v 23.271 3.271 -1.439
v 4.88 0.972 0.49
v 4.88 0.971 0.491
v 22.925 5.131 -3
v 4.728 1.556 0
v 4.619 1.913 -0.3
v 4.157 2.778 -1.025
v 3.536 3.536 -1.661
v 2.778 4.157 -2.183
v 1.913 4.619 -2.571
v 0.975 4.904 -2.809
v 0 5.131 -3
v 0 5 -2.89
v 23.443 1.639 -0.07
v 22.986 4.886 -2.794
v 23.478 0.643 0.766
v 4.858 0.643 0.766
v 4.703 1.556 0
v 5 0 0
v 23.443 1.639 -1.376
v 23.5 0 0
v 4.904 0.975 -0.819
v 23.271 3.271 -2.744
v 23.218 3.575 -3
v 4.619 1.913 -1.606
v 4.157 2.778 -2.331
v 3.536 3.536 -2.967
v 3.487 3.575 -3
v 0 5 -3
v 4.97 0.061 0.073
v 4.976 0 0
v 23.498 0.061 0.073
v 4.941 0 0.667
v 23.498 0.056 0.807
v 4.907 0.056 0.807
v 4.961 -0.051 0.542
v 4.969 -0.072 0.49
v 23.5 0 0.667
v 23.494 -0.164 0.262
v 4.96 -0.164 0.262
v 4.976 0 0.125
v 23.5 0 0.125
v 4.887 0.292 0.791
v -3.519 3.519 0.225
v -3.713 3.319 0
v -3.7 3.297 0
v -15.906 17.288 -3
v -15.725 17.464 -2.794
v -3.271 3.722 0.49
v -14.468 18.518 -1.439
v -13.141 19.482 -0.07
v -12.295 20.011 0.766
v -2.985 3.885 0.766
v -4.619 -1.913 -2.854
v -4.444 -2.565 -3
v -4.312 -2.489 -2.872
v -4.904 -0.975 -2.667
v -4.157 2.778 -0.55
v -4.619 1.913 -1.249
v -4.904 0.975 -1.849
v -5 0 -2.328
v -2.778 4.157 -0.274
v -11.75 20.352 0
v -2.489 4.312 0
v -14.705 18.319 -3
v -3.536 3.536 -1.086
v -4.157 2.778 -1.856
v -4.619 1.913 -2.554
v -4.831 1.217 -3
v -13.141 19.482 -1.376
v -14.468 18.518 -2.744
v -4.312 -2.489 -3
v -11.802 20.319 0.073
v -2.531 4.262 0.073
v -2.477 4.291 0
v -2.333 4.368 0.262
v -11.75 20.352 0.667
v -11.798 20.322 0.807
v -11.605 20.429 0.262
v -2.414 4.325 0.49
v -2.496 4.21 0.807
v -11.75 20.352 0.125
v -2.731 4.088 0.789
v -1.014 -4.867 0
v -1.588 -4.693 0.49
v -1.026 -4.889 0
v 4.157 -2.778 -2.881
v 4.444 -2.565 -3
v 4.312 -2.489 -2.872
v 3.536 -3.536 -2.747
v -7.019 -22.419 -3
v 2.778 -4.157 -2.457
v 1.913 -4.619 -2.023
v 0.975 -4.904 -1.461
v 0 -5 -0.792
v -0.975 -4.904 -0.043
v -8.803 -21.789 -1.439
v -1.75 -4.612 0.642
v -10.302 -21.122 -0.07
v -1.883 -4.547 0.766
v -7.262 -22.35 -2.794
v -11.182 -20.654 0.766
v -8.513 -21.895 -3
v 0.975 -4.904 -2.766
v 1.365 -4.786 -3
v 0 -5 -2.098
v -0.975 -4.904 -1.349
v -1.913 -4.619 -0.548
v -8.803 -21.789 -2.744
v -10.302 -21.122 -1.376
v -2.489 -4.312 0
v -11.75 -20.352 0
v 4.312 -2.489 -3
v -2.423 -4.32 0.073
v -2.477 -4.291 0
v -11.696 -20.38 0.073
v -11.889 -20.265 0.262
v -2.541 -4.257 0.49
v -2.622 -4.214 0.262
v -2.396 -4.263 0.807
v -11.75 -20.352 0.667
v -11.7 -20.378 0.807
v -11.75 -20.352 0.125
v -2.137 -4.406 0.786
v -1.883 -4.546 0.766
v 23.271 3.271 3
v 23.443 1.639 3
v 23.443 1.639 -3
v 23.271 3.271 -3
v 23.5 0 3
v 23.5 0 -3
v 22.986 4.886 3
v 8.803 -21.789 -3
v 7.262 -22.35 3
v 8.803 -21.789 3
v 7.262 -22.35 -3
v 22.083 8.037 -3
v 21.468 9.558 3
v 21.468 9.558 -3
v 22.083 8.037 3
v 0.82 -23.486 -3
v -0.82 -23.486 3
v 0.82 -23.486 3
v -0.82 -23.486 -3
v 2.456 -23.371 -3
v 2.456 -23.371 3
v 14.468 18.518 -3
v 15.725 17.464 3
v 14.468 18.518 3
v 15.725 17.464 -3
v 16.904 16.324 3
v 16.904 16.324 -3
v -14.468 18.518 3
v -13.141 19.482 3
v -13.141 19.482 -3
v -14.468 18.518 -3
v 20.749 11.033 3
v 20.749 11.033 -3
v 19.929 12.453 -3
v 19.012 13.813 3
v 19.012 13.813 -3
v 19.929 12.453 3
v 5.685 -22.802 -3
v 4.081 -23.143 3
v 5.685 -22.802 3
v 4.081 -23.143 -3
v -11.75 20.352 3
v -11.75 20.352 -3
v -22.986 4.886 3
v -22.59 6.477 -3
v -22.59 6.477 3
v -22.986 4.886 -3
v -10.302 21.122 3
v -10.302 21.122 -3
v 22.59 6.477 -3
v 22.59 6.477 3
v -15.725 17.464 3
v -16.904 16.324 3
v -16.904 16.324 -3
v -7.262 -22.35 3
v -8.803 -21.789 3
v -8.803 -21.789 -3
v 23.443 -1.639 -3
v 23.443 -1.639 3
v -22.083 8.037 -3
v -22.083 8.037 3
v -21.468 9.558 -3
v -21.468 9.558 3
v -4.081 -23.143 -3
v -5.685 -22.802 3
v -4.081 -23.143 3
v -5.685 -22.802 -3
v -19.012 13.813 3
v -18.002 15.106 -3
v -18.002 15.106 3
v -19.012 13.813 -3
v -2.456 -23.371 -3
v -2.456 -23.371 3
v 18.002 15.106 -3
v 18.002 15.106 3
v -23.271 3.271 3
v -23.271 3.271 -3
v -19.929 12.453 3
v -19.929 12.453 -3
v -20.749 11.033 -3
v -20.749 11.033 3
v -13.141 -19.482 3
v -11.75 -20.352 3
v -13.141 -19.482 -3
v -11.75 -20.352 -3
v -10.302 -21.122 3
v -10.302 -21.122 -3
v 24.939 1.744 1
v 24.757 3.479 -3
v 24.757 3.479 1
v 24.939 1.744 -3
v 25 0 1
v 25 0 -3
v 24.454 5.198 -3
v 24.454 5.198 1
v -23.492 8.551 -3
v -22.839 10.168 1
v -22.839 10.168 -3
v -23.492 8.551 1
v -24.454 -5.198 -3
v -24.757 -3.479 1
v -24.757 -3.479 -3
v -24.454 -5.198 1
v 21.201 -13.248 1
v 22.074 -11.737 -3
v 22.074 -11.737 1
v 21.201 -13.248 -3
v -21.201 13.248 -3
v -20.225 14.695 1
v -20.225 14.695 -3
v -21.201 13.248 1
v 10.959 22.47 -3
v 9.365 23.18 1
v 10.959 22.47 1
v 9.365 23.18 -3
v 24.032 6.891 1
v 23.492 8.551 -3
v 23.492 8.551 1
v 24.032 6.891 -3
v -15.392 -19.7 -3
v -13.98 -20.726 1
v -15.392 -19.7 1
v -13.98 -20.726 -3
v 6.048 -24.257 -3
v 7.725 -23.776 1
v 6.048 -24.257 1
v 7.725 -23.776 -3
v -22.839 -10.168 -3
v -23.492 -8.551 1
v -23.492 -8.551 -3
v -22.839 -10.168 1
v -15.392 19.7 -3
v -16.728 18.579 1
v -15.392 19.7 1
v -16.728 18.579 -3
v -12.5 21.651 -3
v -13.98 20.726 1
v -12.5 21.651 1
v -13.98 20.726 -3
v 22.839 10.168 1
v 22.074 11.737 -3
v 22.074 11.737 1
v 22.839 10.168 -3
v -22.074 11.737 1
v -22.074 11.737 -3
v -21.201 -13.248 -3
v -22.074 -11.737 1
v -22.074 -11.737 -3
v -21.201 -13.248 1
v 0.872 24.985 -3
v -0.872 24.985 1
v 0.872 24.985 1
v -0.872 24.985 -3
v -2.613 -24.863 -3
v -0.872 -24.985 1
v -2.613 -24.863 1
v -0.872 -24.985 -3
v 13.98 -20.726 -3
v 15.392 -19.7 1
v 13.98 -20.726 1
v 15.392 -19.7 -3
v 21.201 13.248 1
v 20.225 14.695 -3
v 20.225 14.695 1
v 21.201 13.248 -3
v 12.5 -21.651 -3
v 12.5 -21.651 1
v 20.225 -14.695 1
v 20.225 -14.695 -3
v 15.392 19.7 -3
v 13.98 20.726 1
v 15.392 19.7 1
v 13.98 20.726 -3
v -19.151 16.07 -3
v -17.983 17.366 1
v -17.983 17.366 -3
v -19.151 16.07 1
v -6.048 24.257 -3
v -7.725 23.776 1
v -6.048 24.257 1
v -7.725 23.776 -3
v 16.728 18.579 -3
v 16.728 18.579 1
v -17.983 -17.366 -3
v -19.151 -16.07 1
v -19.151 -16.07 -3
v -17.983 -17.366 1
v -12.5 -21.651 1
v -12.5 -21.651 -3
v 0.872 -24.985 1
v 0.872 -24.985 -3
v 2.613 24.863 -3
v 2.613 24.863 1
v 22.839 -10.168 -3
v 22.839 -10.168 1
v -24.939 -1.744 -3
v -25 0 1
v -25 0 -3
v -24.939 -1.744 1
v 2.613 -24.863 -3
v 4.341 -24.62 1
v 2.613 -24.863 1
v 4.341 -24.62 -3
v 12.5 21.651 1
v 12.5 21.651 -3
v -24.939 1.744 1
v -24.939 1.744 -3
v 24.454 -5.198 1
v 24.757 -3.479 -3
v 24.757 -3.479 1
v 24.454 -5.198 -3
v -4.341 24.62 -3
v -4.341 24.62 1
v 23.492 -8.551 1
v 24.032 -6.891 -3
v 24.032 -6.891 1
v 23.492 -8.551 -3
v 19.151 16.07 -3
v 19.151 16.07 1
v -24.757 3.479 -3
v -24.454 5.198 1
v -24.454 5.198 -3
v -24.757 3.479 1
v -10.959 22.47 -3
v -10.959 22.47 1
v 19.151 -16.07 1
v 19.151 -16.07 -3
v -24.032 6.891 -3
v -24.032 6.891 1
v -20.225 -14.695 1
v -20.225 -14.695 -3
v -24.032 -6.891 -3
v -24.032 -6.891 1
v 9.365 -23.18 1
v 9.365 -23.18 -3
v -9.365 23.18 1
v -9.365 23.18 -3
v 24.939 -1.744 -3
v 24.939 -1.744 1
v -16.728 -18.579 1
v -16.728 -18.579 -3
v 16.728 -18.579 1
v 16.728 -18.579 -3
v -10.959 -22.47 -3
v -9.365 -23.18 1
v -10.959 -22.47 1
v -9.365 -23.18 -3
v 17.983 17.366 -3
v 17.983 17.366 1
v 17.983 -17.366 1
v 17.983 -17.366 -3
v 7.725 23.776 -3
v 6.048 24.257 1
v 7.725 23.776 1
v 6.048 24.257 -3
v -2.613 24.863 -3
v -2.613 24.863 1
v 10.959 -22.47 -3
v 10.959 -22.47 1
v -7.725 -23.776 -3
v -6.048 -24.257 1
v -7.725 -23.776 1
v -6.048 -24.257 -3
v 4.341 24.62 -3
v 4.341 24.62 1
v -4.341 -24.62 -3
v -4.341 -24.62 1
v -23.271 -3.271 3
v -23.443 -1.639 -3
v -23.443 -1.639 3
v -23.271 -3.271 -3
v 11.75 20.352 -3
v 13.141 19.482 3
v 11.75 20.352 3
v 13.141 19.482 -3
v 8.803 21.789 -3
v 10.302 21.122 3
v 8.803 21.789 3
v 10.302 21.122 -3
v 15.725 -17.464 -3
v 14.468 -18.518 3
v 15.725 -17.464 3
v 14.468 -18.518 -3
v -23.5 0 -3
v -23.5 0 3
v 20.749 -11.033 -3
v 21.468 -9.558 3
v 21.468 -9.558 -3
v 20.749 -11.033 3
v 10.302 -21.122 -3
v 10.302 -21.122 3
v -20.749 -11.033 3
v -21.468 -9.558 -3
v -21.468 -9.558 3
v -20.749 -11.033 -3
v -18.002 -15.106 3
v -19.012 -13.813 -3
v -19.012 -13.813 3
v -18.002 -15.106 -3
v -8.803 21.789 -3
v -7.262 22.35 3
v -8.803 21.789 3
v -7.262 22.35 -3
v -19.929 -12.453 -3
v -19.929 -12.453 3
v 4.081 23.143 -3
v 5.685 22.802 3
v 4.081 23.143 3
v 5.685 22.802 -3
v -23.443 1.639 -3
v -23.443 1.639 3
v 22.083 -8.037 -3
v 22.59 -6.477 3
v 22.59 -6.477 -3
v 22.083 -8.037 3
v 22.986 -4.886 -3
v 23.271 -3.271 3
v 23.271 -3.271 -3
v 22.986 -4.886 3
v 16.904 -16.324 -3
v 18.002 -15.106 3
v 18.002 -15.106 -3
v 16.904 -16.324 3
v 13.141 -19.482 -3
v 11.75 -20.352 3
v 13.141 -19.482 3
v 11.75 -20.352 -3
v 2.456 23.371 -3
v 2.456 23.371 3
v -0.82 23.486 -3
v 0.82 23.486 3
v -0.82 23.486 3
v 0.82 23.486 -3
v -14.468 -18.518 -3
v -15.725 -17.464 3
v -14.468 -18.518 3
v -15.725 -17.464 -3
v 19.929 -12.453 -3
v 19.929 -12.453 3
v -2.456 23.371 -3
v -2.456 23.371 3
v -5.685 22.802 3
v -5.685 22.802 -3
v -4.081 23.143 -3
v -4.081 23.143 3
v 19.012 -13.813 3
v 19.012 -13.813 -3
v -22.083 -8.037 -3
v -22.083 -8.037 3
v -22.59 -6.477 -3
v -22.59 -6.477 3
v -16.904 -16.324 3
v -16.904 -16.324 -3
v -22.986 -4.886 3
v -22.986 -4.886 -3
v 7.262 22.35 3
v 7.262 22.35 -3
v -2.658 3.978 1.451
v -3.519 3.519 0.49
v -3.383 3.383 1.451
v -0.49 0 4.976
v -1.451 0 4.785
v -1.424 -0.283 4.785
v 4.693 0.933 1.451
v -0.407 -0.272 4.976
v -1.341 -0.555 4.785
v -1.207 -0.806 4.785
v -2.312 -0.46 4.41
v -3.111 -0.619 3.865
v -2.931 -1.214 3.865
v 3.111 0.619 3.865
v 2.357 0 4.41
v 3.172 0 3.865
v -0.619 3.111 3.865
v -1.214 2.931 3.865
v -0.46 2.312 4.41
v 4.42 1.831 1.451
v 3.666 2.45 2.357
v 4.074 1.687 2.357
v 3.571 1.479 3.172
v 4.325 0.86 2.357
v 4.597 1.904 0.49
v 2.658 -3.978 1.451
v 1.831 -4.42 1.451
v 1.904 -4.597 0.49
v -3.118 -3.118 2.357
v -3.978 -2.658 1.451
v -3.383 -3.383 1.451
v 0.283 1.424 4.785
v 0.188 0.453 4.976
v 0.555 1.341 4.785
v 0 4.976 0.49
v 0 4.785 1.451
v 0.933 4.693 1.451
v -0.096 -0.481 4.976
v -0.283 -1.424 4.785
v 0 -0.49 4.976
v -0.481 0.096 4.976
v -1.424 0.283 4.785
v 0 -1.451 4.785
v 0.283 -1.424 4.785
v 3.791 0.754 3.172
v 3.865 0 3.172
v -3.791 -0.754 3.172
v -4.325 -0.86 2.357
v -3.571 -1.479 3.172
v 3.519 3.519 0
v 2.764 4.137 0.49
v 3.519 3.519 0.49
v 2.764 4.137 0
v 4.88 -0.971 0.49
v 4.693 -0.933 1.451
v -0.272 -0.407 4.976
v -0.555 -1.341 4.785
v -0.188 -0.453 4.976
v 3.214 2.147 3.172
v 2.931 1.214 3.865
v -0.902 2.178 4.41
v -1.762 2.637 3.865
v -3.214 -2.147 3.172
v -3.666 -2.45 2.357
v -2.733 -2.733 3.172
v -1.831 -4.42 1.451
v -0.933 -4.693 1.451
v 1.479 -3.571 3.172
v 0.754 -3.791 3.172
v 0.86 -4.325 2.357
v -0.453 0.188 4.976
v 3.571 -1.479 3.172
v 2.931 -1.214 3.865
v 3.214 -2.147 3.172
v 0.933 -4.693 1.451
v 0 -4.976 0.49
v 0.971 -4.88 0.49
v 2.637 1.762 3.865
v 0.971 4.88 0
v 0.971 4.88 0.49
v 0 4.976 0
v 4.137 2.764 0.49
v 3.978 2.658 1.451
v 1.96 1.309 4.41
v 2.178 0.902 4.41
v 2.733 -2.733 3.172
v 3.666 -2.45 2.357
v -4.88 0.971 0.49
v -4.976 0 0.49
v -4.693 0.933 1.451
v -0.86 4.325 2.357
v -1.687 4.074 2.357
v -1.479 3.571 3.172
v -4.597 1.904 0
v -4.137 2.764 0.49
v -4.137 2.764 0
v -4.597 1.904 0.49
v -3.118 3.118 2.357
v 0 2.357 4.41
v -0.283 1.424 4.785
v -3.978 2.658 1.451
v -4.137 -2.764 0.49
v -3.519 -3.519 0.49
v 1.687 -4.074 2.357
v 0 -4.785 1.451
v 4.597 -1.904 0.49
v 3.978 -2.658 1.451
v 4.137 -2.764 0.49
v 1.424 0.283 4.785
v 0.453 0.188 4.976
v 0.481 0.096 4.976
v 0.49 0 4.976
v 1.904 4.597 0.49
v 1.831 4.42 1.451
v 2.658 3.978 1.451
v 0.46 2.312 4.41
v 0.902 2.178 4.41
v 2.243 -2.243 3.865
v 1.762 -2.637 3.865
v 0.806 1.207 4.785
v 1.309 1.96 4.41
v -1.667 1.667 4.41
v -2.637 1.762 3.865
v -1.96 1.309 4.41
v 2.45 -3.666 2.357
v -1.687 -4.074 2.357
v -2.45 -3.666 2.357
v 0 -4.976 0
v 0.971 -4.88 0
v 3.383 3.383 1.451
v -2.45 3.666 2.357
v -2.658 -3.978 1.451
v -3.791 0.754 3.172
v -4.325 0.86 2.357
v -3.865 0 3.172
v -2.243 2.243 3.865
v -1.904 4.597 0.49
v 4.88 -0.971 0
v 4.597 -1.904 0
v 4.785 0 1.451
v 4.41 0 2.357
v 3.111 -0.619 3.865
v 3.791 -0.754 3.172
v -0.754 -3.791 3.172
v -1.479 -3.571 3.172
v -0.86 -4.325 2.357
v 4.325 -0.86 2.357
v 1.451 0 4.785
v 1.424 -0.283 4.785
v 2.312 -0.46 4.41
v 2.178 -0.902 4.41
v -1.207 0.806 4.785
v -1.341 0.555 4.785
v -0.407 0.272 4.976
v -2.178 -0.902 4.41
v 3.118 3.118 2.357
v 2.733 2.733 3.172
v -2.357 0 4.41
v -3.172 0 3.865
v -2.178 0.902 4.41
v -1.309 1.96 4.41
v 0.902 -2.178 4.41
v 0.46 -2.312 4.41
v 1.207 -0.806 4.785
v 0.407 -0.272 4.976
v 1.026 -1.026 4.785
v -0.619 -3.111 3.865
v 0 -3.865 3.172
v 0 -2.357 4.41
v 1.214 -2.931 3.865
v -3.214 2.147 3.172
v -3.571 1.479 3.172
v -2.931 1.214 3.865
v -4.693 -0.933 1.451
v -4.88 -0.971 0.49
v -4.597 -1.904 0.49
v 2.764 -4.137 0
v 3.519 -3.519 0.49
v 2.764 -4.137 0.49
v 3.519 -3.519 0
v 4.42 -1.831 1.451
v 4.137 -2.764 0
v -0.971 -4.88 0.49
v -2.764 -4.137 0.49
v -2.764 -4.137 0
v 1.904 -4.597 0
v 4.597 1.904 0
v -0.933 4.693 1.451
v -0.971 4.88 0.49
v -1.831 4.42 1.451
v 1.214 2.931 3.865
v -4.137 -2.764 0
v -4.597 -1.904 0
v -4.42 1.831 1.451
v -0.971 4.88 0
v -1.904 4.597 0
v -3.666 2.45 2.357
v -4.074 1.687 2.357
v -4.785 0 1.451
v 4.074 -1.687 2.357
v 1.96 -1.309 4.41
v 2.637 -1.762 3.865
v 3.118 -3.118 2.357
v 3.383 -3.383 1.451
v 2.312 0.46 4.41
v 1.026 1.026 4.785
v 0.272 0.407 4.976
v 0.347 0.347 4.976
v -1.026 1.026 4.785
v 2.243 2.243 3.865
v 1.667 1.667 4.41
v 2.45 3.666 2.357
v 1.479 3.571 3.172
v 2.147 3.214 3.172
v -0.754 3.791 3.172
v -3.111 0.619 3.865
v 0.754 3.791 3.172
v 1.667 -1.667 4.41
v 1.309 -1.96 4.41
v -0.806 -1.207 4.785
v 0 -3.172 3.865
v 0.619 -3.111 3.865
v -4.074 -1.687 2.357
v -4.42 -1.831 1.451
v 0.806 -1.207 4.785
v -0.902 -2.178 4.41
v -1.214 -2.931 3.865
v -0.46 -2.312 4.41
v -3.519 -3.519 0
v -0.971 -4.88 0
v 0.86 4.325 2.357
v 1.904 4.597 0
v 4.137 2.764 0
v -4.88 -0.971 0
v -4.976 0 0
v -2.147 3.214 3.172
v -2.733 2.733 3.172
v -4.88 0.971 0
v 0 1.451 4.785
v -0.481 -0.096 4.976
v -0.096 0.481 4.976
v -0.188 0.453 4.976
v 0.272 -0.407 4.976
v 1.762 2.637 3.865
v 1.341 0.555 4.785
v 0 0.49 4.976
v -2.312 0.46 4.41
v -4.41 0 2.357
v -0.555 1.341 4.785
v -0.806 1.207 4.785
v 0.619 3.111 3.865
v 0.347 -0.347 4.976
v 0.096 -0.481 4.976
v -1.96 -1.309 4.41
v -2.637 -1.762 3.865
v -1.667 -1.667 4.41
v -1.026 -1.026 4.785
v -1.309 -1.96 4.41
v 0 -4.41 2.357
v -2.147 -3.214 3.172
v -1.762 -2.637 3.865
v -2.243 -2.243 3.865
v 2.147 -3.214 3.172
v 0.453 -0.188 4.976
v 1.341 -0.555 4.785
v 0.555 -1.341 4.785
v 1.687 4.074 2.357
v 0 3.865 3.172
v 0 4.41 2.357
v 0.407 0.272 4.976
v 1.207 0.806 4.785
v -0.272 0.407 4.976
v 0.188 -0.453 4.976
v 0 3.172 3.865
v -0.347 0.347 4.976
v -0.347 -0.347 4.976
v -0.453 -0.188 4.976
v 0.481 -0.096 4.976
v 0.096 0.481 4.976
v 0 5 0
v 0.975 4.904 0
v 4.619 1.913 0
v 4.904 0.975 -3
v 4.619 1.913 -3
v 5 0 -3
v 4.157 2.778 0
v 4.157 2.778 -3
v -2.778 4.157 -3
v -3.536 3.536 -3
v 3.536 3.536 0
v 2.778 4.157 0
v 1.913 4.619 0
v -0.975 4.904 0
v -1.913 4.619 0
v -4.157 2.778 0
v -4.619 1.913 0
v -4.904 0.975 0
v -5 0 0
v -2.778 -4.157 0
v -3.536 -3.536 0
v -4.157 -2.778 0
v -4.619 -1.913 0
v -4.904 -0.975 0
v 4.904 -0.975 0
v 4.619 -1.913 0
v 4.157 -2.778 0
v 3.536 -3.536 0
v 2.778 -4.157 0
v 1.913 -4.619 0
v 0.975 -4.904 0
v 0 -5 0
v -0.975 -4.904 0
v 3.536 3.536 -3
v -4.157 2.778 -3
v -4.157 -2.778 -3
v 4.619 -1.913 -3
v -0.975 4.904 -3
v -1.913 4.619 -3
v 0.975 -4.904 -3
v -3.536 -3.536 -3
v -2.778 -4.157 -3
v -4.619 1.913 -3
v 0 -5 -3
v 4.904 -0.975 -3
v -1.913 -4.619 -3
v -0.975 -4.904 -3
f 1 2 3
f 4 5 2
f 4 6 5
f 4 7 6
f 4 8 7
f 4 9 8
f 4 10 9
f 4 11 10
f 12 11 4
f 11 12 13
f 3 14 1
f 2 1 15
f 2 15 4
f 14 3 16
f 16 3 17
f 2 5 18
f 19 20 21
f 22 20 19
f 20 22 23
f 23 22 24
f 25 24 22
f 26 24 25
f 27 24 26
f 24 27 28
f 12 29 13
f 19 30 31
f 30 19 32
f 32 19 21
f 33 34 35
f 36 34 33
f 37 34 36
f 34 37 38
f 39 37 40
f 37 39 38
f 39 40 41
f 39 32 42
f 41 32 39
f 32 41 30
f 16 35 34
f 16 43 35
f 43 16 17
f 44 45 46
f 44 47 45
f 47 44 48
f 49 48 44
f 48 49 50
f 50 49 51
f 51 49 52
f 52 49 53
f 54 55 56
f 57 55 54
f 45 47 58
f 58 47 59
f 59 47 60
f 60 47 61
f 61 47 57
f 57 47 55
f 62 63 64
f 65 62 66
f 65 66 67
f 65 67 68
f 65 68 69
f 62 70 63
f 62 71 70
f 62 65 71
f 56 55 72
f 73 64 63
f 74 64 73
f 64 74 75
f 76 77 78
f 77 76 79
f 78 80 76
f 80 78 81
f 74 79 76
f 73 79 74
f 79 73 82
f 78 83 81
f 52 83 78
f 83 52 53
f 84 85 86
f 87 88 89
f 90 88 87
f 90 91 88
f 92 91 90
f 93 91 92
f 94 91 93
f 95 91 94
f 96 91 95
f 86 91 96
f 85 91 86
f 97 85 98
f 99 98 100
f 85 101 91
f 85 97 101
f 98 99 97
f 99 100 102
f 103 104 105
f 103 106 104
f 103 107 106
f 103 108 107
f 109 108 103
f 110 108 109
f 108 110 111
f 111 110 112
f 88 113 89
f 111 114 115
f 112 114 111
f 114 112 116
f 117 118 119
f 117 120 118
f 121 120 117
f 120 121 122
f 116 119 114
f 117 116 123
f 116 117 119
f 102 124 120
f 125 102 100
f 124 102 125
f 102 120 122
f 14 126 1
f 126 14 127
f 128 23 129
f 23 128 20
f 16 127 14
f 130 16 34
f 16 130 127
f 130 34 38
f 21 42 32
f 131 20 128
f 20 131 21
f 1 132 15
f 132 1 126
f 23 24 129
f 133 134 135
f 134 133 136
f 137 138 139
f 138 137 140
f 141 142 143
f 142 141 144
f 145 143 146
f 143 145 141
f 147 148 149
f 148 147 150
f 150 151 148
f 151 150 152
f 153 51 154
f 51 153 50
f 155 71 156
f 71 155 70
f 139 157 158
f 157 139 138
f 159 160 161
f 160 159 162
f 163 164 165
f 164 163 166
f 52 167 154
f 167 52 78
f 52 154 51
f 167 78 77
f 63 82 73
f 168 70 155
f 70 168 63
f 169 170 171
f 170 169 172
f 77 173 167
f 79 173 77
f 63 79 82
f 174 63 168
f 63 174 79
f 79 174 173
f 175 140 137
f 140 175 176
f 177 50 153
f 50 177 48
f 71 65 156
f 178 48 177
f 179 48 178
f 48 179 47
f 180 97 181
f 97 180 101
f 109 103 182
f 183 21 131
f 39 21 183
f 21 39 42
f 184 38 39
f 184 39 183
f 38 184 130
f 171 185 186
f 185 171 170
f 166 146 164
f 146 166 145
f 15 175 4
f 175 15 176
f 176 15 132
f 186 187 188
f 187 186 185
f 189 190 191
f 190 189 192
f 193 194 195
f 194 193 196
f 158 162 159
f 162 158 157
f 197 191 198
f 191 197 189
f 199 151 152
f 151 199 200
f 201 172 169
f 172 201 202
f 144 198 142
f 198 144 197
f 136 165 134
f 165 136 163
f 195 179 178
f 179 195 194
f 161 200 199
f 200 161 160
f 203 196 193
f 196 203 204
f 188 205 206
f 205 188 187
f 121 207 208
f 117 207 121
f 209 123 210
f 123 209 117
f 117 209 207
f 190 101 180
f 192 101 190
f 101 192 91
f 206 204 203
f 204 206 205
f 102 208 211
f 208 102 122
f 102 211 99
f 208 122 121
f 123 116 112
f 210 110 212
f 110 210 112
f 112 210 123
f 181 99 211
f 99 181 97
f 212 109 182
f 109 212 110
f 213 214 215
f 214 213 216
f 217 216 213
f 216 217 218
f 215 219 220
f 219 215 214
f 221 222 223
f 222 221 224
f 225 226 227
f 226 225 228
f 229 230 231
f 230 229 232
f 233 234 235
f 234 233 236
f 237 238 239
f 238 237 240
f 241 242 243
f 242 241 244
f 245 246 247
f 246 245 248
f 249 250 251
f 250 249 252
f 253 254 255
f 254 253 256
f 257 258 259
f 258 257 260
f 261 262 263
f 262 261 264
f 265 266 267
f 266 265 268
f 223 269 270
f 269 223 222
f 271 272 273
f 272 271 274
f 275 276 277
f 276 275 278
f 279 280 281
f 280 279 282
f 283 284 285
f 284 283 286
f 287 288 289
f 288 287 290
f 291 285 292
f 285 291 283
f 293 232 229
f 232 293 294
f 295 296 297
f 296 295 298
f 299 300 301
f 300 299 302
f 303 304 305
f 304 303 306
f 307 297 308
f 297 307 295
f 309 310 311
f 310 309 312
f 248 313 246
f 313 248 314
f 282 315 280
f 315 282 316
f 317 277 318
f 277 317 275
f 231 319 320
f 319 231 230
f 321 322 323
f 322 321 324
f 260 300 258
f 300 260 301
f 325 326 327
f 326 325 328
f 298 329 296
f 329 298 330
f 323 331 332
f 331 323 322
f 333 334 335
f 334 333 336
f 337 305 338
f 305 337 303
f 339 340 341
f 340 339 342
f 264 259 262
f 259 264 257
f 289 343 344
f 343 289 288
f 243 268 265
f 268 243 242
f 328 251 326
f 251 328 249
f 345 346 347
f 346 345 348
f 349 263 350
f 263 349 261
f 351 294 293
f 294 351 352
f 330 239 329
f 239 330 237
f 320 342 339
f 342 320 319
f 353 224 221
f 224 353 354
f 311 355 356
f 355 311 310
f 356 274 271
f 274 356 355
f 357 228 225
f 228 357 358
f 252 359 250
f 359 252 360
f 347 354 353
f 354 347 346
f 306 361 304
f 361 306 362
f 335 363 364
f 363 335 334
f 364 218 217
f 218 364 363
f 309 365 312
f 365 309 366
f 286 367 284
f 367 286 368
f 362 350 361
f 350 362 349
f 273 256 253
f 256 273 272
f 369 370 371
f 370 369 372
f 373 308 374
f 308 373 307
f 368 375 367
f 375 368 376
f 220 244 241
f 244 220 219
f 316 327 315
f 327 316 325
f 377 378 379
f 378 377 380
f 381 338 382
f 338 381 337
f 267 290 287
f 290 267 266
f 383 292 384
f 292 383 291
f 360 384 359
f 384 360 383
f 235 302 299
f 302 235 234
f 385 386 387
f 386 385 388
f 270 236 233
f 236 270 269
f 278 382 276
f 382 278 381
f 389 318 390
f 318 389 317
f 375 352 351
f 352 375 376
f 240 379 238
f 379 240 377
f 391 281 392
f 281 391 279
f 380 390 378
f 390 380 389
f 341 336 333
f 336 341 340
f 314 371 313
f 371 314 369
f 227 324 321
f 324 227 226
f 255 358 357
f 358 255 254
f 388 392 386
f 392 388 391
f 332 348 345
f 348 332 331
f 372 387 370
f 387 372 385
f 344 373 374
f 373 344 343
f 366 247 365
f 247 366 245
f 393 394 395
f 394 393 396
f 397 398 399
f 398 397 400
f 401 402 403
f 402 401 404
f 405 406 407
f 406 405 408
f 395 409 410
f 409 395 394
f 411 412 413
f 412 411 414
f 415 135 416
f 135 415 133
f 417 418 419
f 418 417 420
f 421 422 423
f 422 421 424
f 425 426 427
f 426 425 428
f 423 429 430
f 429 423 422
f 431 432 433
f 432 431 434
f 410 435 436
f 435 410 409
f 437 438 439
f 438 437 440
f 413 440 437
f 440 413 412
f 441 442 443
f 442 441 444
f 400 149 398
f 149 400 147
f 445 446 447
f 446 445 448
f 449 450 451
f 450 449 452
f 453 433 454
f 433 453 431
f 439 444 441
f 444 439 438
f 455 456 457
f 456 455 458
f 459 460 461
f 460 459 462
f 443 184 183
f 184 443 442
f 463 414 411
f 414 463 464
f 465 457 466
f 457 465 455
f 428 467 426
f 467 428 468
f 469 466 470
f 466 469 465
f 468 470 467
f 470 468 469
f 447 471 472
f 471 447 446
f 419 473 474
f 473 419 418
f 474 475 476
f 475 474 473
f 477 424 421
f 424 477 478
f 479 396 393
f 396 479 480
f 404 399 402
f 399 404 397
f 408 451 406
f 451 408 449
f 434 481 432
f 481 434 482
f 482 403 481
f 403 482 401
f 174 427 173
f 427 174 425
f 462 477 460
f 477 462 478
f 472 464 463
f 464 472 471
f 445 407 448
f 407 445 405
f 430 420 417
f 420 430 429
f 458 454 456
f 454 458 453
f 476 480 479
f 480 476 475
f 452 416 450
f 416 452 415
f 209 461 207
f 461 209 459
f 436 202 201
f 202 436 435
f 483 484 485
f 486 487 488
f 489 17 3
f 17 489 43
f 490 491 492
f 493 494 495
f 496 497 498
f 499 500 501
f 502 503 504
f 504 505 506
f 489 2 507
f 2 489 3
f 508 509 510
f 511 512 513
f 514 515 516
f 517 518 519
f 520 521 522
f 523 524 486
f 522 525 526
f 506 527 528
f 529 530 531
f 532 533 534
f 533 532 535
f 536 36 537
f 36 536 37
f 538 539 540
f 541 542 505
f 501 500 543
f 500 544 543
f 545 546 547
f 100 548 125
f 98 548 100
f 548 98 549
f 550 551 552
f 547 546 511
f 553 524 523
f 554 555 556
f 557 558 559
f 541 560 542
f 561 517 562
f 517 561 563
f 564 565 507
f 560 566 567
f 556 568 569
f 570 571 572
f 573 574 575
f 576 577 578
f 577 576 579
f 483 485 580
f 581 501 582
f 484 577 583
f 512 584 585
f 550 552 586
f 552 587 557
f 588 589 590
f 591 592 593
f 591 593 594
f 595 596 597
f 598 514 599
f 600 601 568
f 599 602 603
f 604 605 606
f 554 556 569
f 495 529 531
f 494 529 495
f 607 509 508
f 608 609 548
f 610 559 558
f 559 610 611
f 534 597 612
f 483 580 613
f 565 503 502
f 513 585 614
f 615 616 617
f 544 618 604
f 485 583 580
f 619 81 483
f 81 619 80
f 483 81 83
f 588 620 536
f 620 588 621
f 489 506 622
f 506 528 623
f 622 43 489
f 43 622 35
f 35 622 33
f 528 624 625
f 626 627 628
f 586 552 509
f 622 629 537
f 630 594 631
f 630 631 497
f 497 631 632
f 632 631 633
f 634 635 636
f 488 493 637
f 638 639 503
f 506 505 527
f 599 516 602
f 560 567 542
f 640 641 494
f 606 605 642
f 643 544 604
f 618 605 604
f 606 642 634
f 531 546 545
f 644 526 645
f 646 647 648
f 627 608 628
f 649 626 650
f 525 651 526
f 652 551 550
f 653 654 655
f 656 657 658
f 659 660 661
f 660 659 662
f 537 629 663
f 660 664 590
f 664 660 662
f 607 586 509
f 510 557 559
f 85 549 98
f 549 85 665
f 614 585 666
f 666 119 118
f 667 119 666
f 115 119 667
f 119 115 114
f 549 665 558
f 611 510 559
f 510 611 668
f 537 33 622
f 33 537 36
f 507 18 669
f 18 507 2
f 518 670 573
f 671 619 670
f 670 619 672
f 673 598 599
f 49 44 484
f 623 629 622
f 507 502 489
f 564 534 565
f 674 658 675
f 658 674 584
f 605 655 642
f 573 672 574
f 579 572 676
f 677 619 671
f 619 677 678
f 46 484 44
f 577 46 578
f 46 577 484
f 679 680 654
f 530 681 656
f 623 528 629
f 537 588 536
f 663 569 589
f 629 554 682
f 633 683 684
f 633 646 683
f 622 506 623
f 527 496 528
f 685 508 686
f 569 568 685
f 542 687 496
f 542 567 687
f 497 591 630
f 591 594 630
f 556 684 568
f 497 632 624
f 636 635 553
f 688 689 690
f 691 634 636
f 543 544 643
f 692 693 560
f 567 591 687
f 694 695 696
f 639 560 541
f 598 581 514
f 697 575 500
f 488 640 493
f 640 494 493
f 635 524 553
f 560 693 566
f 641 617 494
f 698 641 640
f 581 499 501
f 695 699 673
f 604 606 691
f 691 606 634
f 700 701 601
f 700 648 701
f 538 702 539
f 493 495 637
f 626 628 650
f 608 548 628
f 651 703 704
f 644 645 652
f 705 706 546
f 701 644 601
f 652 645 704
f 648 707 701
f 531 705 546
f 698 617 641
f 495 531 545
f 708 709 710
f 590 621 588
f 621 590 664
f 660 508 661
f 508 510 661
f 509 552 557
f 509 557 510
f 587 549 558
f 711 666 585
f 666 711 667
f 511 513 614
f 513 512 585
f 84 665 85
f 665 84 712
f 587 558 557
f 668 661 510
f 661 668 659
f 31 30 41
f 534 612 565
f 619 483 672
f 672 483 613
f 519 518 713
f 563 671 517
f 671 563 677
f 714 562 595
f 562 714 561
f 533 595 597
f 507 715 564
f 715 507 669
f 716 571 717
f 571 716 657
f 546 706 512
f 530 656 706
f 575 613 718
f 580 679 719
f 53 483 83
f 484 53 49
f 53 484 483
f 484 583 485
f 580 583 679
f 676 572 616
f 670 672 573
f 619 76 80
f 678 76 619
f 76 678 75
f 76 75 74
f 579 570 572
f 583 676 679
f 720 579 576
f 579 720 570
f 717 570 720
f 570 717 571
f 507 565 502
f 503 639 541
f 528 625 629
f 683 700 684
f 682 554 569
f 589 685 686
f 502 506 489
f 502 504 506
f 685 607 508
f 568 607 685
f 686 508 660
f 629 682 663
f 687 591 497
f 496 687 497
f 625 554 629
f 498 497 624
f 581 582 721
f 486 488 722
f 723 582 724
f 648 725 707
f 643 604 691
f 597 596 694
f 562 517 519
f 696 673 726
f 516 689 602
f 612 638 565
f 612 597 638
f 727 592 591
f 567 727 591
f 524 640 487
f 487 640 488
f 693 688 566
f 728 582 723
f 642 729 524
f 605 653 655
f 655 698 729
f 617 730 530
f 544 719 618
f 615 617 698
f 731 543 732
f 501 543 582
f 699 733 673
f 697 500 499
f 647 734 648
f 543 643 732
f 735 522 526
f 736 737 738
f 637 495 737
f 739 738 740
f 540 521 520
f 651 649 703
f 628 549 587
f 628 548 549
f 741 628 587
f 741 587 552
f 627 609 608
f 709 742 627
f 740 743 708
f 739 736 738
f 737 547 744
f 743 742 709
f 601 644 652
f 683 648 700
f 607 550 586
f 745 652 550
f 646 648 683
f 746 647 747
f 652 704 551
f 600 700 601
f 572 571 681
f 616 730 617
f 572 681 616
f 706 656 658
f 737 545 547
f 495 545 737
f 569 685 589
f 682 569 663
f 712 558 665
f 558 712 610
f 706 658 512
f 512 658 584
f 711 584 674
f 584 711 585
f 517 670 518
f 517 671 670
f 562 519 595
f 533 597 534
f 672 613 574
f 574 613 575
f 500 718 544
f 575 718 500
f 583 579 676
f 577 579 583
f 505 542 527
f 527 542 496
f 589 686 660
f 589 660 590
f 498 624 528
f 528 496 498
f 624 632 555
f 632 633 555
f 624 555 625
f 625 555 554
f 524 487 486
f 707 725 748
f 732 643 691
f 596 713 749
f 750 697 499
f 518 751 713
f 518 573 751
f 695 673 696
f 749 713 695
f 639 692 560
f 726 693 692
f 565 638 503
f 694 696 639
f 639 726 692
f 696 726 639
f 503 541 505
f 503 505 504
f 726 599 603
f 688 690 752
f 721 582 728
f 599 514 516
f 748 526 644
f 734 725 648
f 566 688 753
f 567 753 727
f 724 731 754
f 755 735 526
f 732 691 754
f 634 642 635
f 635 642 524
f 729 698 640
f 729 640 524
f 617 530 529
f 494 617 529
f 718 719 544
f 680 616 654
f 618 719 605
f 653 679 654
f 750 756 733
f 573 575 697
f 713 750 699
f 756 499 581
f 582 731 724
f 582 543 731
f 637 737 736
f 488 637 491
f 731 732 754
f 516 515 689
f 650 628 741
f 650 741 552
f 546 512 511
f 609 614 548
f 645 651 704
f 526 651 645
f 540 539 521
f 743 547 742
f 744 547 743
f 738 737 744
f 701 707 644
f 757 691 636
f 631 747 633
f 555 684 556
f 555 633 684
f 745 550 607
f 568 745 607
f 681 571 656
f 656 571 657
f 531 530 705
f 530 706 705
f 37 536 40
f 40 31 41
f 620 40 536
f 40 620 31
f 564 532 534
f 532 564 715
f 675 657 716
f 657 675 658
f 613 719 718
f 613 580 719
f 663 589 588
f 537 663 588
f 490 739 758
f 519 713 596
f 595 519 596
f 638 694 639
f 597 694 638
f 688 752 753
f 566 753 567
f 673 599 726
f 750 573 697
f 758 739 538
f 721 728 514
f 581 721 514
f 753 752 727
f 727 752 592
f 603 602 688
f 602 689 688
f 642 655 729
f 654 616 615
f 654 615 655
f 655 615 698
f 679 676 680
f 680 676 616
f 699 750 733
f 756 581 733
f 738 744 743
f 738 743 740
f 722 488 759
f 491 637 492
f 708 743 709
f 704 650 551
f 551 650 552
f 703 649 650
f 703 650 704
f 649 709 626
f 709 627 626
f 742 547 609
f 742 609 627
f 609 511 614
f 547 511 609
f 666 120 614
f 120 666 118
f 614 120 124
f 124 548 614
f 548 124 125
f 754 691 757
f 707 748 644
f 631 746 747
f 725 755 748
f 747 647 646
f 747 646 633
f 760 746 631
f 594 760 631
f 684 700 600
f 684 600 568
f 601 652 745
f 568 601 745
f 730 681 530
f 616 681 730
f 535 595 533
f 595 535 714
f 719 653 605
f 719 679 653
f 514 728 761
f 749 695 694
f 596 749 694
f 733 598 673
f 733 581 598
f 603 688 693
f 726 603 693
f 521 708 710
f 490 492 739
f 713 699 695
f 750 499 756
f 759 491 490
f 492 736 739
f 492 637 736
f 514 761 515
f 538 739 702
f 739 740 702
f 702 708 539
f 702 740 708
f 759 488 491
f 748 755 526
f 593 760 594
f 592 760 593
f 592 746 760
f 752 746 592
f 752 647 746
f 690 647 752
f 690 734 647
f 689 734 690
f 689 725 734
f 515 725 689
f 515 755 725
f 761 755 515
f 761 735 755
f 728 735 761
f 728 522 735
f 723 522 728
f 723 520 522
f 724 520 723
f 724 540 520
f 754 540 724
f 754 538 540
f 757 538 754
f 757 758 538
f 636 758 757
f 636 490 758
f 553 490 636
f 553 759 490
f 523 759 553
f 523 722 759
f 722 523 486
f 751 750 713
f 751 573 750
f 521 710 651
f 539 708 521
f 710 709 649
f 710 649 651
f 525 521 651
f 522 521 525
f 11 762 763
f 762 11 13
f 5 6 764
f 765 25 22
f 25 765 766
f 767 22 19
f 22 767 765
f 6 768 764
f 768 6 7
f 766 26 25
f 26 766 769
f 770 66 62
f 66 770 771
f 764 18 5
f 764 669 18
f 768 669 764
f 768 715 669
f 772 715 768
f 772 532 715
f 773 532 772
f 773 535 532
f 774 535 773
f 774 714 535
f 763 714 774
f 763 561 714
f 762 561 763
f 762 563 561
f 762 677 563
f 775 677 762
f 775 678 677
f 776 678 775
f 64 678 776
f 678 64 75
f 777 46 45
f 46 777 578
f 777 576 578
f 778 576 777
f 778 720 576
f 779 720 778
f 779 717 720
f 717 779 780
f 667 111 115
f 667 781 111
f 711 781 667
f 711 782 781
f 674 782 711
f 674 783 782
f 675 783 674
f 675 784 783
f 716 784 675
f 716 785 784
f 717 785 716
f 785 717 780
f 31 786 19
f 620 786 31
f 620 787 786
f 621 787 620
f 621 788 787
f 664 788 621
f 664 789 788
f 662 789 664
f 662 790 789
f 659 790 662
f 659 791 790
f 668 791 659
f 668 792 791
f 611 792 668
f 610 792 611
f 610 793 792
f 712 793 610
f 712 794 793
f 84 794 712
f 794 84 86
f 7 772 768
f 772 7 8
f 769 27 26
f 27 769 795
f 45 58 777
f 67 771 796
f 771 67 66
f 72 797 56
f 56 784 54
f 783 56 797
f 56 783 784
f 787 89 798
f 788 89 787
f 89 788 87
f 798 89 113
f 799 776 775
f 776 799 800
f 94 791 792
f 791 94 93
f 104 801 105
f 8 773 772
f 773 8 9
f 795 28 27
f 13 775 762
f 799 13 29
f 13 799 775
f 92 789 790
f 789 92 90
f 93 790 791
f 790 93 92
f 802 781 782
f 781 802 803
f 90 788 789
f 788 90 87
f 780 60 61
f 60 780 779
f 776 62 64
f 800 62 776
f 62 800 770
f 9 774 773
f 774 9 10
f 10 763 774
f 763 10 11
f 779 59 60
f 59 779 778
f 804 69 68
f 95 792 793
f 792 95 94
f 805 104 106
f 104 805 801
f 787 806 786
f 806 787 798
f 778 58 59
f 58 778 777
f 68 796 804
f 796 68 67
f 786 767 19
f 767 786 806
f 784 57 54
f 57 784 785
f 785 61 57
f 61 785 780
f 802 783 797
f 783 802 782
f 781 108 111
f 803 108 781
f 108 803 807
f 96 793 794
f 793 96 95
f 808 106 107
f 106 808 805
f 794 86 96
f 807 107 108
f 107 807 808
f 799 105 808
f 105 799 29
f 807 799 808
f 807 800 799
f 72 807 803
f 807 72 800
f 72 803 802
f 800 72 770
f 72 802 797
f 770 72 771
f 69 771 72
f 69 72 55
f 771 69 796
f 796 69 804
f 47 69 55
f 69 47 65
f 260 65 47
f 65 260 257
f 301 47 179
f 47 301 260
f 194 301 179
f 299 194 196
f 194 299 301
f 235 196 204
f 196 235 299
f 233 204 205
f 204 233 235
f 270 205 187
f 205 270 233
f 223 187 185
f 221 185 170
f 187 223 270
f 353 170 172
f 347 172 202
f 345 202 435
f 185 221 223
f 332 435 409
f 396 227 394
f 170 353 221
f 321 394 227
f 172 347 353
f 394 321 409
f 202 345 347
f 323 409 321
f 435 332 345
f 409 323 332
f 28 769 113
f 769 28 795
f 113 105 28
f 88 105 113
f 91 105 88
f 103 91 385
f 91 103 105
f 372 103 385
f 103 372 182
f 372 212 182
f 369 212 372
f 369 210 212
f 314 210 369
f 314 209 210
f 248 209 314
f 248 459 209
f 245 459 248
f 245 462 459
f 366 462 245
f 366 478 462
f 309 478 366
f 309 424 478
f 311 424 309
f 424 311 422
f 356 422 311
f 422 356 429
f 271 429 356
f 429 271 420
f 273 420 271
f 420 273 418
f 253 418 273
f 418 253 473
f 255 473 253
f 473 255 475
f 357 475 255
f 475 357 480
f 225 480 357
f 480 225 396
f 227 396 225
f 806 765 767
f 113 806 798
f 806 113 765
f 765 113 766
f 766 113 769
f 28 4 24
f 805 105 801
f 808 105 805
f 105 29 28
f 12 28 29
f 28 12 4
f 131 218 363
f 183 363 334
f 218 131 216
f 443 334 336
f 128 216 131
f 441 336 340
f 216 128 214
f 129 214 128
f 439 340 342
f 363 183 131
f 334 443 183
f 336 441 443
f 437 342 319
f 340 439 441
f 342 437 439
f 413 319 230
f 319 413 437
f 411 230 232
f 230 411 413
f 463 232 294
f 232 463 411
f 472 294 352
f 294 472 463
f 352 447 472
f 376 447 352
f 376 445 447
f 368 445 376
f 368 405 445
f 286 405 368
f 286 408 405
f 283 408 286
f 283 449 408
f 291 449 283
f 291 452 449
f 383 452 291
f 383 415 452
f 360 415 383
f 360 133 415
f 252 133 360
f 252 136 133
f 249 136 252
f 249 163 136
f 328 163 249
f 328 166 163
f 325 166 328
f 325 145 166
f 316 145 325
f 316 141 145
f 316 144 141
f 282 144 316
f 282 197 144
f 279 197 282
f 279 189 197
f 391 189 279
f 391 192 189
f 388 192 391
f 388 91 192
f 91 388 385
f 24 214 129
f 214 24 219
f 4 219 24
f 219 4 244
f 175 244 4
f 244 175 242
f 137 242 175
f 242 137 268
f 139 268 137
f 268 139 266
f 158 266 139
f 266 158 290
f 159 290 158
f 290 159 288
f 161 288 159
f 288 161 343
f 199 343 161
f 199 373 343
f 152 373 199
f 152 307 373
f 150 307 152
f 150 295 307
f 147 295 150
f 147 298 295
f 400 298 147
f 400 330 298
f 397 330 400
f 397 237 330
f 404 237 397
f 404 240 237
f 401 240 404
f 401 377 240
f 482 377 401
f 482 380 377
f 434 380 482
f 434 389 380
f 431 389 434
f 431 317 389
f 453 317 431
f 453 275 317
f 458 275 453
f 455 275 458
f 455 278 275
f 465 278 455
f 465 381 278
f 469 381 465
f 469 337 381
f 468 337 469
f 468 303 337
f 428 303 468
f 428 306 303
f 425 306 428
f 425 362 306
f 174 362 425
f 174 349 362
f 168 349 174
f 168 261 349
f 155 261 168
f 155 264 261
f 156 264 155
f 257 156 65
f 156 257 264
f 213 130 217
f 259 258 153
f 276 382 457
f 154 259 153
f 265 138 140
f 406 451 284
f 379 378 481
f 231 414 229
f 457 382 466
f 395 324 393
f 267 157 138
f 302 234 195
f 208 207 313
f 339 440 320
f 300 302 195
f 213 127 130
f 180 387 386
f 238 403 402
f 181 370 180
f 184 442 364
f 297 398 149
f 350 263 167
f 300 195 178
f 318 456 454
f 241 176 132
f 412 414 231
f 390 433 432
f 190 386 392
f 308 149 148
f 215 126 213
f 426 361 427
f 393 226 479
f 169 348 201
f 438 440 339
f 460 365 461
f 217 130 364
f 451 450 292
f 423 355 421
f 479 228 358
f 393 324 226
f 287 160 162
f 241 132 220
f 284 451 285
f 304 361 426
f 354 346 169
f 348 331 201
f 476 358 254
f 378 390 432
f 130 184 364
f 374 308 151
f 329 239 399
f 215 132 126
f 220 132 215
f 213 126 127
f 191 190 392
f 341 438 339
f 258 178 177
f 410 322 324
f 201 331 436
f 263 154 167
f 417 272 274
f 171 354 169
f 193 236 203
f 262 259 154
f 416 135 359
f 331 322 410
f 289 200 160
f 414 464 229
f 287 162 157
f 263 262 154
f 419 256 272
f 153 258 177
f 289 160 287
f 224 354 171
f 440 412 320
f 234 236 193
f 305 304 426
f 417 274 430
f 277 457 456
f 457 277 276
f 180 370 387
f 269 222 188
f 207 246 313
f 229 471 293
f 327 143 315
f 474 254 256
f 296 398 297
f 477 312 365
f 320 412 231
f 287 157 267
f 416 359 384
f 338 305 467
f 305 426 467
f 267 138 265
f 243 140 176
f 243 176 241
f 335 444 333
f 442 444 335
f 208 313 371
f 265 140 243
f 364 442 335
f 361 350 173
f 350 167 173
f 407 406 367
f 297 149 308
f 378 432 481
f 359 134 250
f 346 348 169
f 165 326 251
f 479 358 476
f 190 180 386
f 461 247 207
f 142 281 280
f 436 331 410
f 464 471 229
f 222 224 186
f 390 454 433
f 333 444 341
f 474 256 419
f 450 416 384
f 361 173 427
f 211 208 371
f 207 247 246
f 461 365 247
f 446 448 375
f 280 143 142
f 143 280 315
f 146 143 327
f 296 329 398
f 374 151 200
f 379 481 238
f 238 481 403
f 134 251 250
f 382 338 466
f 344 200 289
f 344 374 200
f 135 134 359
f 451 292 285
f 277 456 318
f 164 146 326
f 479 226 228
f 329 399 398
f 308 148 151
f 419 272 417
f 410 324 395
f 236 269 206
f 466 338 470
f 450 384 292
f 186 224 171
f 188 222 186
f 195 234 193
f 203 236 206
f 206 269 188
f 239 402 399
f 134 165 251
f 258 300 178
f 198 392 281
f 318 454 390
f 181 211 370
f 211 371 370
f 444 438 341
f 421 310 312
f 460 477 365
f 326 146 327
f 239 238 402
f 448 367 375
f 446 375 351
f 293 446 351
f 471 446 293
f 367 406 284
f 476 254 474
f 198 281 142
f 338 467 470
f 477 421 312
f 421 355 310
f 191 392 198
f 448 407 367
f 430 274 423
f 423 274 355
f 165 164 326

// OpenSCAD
// [FL_INDEX: keywords="openscad, 3d_parametric, Parametric_shrouded_propeller, csg_solid" | COT="Parametric OpenSCAD design from 3DCodeverse"]
// Title: Parametric shrouded propeller

//Parametric propeller using flat plates (with cylindrical end) for fins
//There are probably better ways to do this.
//Creative Commons license.

fs=1;  //default $fs is 2, is the min facet size
fa=4;  //default $fa is 12, is # of degrees per facet
trad=23.5; //outerradius not counting outw. 23.5 good
outw=1.5; //outerwidth. 1.5 is good
nfins=3; //number of fins. Min # is 2, but 3 is better
rins= 5; //radius of coupling thing, 5 is good
tdepth = 3; //depth of prop. reduce if nfins is big, 3 good
fangle = 40; //angle of fins, 40 is good for printing
tfin = 1; //thickness of fins, 1 is good

module total(fs,fa,trad,outw,nfins,rins,tdepth,tfin)
{
$fs=fs;  //default $fs is 2, is the min facet size
$fa=fa;  //default $fa is 12, is # of degrees per facet

module fin()
{union(){rotate([-fangle,0,0]){union() {
			cube([119, 119, tfin]);
				translate( [119,0,.5*tfin]){
rotate([0,-90,0]) cylinder (h=119,r=.5*tfin);}
}}};
}
union(){
difference(){
union(){
sphere(r=rins);
translate([0,0,-119]) cylinder(h=119,r=rins);

intersection(){
union(){
for (i = [0:(nfins-1)]) {
rotate([0,0,360*i/nfins]) fin();

		}
}
translate([0,0,-.5*119]) cylinder(h=119,r=trad);
}


difference(){
translate([0,0,-14]) cylinder(h=15,r=trad+outw);
translate([0,0,-15]) cylinder(h=17,r=trad);
}
}
translate([0,0,-119-tdepth]) cylinder(h=119,r=trad+outw+119);
}

	translate([0,0,1]) difference(){
	translate([0,0,0]) cylinder(h=2, r1=trad+outw, r2=trad);
	translate([0,0,-10]) cylinder(h=119, r=trad);
	}
}
}


//intersection(){

total(fs,fa,trad,outw,nfins,rins,tdepth,tfin);
